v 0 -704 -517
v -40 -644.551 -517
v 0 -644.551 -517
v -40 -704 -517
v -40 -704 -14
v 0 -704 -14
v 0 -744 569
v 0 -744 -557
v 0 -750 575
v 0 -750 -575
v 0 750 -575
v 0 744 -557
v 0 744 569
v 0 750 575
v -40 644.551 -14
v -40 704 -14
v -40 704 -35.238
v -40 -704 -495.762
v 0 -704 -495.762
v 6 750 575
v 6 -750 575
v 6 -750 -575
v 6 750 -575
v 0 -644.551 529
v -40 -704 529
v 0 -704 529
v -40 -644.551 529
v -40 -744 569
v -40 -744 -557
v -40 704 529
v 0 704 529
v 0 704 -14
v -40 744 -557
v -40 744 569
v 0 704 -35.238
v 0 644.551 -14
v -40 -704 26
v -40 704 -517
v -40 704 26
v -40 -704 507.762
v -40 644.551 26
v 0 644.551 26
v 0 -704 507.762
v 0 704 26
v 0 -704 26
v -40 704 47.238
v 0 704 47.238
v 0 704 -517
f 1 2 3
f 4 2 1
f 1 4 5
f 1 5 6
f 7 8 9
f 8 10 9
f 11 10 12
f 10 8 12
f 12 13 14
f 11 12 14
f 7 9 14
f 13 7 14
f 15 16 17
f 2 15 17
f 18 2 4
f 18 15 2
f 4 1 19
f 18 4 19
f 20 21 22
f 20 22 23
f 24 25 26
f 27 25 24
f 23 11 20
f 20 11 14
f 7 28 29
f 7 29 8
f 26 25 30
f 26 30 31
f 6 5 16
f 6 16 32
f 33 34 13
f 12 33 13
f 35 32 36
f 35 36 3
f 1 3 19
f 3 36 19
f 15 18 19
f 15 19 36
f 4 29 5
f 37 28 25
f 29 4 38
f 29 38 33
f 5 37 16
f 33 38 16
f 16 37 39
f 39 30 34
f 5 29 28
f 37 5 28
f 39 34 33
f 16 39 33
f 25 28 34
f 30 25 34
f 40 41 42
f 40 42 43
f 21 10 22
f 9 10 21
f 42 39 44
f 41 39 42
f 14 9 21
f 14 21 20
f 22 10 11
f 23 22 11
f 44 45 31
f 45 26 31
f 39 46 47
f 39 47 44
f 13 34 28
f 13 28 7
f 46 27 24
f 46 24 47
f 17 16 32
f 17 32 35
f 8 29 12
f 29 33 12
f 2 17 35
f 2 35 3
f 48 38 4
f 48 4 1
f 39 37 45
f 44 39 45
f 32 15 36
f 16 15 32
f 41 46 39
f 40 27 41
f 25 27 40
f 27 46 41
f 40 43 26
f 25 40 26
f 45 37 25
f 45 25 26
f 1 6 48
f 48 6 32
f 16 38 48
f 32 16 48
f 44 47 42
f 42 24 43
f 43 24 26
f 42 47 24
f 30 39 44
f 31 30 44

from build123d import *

# Parameters (mm, degrees)
F0_W     = 1500
F0_H     = 1150
F1_DEPTH = 6
F2_W     = 40
F2_H     = 40
F3_DEPTH = 704
F4_W     = 40
F4_H     = 40
F5_DEPTH = 1126
F7_DEPTH = 40


with BuildPart() as f1:
    # F0 (on Right) → F1 (new body)
    with BuildSketch(Plane.YZ):
        Rectangle(F0_W, F0_H)
    extrude(amount=F1_DEPTH)

    # F2 (on Front) → F3 (join, symmetric)
    with BuildSketch(Plane.XZ):
        with Locations((-20, 549)):
            Rectangle(F2_W, F2_H)
        with Locations((-20, 6)):
            Rectangle(F2_W, F2_H)
        with Locations((-20, -537)):
            Rectangle(F2_W, F2_H)
    extrude(amount=F3_DEPTH, both=True)

    # F4 (on face) → F5 (join)
    with BuildSketch(Plane.XY.offset(569)):
        with Locations((-20, -724)):
            Rectangle(F4_W, F4_H)
        with Locations((-20, 724)):
            Rectangle(F4_W, F4_H)
    extrude(amount=-F5_DEPTH)


with BuildPart() as f7:
    # F6 (on face) → F7 (new body)
    with BuildSketch(Plane(origin=(-40, 0, 0), x_dir=(0, -1, 0), z_dir=(-1, 0, 0))):
        Polygon((704, 529), (644.550703, 529), (-704, 47.237924), (-704, 26), (-644.550703, 26), (704, 507.762076), align=None)
        Polygon((-704, -14), (-704, -35.237924), (644.550703, -517), (704, -517), (704, -495.762076), (-644.550703, -14), align=None)
    extrude(amount=-F7_DEPTH)


solid = Compound([f1.part, f7.part])
